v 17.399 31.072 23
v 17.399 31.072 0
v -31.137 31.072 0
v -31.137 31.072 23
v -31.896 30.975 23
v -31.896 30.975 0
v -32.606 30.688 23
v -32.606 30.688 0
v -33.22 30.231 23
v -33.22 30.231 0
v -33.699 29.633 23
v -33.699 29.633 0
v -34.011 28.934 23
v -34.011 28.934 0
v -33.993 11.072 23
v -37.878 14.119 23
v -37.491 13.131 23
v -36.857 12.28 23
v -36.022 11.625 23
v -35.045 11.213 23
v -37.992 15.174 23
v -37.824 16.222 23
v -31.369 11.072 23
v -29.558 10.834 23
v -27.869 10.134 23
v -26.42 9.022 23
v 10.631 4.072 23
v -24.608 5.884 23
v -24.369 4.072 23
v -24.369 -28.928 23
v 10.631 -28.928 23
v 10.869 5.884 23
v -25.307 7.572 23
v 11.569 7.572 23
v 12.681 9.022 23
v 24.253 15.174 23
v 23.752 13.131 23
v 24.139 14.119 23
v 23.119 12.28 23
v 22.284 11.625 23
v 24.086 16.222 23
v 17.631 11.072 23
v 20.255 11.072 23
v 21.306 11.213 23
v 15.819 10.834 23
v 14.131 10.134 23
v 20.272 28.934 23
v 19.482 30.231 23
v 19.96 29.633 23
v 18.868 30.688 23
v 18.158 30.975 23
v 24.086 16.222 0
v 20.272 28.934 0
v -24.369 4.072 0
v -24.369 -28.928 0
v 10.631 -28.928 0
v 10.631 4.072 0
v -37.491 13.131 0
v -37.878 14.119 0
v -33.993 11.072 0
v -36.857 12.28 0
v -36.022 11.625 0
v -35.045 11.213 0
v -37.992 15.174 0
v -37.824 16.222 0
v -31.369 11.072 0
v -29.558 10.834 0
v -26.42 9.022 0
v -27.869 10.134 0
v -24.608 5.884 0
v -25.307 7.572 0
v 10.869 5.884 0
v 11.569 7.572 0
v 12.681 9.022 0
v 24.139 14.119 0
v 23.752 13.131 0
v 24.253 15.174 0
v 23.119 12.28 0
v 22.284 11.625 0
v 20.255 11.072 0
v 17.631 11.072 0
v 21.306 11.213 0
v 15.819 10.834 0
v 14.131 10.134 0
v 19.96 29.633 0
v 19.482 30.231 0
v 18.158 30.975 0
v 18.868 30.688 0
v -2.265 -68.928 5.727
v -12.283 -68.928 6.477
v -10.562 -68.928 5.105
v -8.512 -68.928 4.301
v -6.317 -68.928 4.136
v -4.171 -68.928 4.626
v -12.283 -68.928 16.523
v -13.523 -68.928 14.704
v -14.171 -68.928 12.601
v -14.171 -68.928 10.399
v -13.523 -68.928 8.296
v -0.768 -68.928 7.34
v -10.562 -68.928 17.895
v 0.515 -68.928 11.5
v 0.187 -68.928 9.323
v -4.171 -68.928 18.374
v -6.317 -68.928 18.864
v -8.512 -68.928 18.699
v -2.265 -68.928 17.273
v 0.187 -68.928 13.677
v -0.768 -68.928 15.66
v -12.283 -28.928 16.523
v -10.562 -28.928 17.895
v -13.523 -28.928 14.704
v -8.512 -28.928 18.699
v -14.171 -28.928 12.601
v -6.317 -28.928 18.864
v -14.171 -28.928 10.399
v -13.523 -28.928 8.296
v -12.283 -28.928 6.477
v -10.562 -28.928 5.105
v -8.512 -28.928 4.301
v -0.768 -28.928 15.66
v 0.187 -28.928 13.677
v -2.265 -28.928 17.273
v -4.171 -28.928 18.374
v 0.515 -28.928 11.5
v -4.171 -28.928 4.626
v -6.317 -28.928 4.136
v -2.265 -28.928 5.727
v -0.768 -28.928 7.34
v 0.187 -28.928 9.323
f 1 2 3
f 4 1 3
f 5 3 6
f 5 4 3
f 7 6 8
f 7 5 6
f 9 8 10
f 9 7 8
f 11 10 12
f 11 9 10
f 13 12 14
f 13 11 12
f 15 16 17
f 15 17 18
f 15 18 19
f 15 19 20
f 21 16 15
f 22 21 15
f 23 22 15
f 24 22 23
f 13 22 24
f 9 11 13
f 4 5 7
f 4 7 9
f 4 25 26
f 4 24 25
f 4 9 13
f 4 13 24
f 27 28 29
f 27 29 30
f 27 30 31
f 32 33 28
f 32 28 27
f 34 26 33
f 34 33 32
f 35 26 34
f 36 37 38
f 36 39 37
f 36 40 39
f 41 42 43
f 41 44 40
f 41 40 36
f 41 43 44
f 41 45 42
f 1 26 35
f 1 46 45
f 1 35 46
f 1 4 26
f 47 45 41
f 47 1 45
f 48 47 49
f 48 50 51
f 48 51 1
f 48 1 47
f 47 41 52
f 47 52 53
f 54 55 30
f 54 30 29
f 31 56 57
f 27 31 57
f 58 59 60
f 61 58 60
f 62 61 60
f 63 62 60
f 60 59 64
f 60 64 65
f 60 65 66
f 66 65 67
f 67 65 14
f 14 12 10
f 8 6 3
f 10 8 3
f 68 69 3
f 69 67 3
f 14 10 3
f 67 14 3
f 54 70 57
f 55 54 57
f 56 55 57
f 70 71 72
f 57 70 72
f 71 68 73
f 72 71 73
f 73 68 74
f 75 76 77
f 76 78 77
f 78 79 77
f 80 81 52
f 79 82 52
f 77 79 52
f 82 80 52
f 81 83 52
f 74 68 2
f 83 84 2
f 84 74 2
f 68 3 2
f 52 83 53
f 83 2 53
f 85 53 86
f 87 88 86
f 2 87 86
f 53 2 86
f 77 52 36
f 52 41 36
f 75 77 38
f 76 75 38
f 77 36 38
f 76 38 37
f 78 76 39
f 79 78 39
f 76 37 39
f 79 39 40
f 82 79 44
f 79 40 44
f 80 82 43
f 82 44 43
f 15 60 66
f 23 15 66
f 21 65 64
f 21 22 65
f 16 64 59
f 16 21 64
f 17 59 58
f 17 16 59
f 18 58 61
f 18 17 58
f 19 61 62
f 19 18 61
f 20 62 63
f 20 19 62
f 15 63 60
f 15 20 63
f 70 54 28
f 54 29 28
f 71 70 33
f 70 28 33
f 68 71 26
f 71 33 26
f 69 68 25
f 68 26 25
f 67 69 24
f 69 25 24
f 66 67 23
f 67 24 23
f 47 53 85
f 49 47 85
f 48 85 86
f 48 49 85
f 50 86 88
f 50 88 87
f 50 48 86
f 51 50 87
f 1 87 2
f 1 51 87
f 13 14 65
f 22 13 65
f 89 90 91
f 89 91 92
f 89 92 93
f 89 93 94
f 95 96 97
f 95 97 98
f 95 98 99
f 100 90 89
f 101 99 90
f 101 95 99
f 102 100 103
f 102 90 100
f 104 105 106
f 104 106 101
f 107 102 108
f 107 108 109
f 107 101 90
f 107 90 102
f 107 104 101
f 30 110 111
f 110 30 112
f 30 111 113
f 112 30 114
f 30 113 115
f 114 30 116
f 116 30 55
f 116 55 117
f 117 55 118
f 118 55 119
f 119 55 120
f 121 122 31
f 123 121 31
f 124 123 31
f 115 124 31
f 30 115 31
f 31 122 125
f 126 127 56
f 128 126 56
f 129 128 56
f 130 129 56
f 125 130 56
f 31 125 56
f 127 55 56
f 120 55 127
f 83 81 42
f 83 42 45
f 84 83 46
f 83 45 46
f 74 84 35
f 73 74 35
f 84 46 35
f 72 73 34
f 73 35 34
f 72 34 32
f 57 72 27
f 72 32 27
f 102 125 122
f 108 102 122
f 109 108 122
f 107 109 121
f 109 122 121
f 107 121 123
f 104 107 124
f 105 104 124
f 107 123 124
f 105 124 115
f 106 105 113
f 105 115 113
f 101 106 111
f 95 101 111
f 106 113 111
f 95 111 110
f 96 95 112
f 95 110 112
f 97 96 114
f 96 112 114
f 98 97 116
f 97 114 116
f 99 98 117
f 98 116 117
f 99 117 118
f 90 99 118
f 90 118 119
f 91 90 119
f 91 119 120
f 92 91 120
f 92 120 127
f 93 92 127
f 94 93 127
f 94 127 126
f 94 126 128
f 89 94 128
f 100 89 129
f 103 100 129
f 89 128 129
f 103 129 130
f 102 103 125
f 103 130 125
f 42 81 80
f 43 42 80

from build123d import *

# Parameters (mm, degrees)
F0_W     = 35
F0_H     = 40
F1_DEPTH = 23
F2_R     = 3
F3_R     = 4
F4_R     = 7
F5_R     = 7.384577
F6_DEPTH = 40


with BuildPart() as f1:
    # F0 (on Top) → F1 (new body)
    with BuildSketch(Plane.XY):
        with Locations((-6.869268, -8.927752)):
            Rectangle(F0_W, F0_H)
        Polygon((19.630732, 31.072248), (-33.369268, 31.072248), (-39.369268, 11.072248), (-24.369268, 11.072248), (10.630732, 11.072248), (25.630732, 11.072248), align=None)
    extrude(amount=F1_DEPTH)

    # F2
    f2_edges = [f1.edges().sort_by_distance(p)[0] for p in [
        (-33.369268, 31.072248, 11.5),
        (19.630732, 31.072248, 11.5),
    ]]
    fillet(f2_edges, radius=F2_R)

    # F3
    f3_edges = [f1.edges().sort_by_distance(p)[0] for p in [
        (-39.369268, 11.072248, 11.5),
        (25.630732, 11.072248, 11.5),
    ]]
    fillet(f3_edges, radius=F3_R)

    # F4
    f4_edges = [f1.edges().sort_by_distance(p)[0] for p in [
        (-24.369268, 11.072248, 11.5),
        (10.630732, 11.072248, 11.5),
    ]]
    fillet(f4_edges, radius=F4_R)

    # F5 (on face) → F6 (join)
    with BuildSketch(Plane.XZ.offset(28.927752)):
        with Locations((-6.869268, 11.5)):
            Circle(F5_R)
    extrude(amount=F6_DEPTH)


solid = f1.part
